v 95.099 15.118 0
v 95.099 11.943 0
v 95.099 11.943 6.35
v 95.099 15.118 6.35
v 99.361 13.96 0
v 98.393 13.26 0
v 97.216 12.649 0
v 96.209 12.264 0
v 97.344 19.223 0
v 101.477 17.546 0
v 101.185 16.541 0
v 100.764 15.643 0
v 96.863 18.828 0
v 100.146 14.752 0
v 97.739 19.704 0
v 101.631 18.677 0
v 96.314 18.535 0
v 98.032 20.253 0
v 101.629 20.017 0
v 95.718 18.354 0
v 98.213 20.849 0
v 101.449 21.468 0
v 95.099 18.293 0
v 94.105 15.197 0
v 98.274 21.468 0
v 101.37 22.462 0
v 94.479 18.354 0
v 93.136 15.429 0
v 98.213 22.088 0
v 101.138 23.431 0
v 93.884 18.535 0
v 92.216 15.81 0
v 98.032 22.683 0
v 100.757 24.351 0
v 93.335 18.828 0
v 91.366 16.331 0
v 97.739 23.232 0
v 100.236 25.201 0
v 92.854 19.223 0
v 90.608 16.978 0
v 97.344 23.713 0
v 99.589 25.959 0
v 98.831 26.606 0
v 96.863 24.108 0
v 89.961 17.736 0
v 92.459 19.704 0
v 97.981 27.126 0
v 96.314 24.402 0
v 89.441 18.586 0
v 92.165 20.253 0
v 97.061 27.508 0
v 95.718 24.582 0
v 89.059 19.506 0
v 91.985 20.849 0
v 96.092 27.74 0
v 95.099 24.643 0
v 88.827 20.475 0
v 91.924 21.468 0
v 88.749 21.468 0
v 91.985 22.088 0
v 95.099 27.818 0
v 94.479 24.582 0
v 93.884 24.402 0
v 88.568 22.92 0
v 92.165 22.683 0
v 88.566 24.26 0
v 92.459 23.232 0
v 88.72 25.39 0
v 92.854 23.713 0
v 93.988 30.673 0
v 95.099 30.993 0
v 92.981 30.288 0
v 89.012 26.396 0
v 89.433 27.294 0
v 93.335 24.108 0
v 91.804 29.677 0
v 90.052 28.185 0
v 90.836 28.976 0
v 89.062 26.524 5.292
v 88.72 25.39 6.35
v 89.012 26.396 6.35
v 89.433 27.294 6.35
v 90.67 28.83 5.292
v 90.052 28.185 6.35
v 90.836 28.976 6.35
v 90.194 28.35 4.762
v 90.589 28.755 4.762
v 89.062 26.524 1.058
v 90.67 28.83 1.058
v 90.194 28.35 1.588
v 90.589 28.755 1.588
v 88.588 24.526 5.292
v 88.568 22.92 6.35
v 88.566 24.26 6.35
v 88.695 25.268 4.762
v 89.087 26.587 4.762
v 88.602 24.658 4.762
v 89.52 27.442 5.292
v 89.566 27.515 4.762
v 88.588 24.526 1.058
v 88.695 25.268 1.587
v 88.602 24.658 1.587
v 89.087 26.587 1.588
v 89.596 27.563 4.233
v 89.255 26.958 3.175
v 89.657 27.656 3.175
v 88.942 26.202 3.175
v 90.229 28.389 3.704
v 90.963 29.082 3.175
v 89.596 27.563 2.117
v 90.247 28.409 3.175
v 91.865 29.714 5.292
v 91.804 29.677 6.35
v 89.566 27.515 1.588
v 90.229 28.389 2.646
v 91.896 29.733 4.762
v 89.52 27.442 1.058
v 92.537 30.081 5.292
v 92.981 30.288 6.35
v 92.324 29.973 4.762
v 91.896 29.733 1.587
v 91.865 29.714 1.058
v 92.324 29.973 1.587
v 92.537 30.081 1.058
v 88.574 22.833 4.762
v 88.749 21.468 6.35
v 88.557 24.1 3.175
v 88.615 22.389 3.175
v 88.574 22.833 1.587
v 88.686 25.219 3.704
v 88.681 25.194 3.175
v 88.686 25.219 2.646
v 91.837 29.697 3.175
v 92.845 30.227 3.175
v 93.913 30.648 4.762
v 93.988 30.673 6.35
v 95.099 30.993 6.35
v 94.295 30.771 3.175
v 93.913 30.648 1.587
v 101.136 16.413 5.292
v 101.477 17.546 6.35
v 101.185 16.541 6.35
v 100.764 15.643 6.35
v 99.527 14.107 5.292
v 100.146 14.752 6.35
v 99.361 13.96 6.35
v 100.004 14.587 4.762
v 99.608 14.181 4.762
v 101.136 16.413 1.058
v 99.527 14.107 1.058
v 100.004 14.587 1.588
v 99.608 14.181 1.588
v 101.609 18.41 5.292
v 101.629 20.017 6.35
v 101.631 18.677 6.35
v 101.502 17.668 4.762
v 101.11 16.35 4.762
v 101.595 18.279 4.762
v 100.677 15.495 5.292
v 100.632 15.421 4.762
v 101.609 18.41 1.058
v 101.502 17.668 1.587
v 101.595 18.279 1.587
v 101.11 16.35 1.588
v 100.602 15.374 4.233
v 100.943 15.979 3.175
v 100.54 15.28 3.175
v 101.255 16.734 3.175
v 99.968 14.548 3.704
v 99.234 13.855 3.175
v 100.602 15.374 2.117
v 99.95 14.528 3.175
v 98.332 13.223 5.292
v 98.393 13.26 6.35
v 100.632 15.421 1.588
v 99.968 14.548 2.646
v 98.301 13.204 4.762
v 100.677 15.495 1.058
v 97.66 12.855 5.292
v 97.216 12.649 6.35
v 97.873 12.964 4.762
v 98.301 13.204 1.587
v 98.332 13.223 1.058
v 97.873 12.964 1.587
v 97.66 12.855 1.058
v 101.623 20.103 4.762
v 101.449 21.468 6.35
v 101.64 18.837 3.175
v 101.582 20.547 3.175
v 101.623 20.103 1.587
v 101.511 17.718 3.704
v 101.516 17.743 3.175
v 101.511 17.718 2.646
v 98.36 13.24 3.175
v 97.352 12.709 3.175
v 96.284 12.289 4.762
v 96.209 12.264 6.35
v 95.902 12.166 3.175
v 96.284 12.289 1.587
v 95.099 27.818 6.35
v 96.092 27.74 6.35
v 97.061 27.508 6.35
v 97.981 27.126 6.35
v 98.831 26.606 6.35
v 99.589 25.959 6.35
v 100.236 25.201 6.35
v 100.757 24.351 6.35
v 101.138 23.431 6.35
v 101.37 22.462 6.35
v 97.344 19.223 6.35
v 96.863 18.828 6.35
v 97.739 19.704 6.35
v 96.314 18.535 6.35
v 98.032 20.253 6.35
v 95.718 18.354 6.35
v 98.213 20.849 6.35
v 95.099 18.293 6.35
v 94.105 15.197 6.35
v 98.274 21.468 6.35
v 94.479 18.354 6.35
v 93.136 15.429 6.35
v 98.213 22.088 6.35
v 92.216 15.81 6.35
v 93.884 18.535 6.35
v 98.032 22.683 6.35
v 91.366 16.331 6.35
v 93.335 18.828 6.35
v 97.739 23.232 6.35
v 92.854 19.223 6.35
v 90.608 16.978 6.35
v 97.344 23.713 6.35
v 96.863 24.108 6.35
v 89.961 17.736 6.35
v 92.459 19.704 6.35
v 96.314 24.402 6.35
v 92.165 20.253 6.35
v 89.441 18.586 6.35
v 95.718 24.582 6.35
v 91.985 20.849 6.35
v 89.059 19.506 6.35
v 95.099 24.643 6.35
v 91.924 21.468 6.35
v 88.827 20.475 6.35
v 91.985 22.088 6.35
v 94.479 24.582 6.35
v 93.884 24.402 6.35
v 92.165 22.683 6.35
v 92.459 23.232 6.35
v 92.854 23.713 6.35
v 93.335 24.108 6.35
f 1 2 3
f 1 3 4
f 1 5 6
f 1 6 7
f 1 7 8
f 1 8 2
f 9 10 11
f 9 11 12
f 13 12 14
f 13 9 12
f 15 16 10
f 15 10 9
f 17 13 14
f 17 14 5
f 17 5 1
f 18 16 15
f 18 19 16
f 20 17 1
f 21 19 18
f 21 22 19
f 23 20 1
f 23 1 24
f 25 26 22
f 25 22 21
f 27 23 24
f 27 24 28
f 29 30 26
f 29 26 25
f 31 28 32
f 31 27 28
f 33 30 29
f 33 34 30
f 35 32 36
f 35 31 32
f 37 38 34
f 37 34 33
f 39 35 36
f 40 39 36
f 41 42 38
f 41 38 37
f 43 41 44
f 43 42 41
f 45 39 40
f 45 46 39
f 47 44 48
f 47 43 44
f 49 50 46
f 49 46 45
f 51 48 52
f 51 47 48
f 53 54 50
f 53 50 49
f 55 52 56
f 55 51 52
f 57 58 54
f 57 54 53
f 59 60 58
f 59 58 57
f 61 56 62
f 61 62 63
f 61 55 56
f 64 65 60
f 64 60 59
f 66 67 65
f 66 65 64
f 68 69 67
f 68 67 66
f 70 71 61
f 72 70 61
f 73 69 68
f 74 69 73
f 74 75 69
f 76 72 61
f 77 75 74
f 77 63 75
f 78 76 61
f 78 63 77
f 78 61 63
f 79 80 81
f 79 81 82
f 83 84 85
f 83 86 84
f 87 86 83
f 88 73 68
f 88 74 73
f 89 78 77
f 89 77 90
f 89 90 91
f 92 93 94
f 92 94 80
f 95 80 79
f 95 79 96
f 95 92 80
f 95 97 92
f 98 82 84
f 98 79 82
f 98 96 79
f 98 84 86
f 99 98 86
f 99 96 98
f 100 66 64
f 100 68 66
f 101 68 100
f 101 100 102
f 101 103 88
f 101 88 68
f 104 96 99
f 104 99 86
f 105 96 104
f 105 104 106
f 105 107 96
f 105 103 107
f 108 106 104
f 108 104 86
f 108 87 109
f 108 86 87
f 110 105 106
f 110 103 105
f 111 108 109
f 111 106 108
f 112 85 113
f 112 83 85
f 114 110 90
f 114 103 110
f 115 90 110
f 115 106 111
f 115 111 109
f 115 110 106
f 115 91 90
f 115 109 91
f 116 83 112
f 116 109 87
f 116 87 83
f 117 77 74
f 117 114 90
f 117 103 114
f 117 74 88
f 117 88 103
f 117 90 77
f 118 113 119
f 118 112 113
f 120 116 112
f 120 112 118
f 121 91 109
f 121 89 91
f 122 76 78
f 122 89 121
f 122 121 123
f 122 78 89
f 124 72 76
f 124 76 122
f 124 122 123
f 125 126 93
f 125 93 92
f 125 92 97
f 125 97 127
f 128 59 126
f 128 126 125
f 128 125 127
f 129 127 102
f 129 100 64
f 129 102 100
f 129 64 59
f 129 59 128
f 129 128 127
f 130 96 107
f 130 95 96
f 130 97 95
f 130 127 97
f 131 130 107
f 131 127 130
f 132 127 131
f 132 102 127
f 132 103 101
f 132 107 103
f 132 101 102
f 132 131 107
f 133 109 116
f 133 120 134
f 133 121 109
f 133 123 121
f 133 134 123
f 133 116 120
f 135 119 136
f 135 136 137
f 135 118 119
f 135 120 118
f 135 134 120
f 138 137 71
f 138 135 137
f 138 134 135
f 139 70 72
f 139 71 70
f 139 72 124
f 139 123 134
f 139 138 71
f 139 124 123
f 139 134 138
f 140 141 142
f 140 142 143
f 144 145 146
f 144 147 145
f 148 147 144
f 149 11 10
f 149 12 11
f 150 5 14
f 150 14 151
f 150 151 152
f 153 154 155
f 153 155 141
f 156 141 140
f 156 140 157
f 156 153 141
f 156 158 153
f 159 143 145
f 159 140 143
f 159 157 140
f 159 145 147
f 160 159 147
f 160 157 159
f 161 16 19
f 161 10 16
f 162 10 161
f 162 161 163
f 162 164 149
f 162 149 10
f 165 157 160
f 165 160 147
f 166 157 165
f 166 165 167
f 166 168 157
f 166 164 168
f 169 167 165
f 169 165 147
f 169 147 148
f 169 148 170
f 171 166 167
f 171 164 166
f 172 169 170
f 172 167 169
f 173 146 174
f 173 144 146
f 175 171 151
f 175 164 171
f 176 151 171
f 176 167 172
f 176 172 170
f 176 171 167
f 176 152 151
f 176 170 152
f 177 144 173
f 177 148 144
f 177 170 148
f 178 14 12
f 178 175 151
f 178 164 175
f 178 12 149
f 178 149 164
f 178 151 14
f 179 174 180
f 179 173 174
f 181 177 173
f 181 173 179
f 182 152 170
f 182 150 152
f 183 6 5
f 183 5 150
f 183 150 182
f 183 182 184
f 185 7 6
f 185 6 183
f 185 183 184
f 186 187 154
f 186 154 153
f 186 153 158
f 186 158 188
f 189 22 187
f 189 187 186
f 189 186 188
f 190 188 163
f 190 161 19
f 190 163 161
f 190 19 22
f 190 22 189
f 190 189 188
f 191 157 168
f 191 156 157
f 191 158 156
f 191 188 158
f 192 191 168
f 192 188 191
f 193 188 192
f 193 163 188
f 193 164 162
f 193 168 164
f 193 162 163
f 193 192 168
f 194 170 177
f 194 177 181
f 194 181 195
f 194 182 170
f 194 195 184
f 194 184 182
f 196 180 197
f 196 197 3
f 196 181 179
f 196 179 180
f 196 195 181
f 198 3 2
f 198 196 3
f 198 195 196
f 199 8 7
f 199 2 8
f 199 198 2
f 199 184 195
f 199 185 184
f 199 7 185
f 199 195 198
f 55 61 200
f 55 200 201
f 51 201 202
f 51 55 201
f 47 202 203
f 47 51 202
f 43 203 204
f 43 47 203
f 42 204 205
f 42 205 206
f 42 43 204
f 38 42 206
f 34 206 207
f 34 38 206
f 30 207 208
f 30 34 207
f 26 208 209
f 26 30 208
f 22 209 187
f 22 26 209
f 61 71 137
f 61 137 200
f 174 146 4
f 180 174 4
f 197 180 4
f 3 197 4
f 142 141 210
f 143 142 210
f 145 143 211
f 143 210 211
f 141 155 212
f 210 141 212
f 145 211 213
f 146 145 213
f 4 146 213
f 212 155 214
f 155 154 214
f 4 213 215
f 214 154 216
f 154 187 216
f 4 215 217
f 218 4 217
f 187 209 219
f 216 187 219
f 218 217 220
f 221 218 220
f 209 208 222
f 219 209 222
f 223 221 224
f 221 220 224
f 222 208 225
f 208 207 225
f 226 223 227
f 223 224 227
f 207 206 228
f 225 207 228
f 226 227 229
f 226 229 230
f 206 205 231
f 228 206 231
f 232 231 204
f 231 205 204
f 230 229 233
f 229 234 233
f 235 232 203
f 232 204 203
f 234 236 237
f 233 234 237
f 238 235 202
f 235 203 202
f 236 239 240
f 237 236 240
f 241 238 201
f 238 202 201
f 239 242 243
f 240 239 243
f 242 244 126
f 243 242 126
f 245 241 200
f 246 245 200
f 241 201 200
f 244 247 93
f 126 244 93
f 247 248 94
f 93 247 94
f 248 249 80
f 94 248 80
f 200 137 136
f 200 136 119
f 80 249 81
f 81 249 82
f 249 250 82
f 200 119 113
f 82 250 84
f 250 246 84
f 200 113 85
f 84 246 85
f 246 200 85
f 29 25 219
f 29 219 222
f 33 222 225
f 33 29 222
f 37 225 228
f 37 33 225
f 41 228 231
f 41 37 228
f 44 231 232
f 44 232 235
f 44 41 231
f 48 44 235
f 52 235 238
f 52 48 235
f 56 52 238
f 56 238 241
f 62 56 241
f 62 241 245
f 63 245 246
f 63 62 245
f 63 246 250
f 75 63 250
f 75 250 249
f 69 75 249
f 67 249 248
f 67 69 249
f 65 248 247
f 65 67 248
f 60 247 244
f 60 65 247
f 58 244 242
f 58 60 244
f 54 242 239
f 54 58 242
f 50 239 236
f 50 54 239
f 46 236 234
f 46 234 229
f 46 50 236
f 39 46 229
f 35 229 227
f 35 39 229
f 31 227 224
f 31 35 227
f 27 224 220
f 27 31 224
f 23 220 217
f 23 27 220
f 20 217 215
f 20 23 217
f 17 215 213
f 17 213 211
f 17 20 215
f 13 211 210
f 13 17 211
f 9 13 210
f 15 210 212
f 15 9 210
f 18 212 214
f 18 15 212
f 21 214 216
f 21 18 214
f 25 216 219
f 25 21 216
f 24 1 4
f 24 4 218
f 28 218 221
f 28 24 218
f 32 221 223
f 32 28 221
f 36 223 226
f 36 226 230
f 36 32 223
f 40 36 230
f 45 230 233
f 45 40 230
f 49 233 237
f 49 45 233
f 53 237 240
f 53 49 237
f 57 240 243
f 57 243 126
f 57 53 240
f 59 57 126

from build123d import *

# Parameters (mm, degrees)
SKETCH2_R           = 3.175
BOSS_EXTRUDE1_DEPTH = 6.35


with BuildPart() as part:
    # Sketch2 → Boss-Extrude1 (new body)
    with BuildSketch(Plane.XY):
        with BuildLine():
            add(Edge.make_bspline(
                [(88.748610912, 21.468378691), (87.390018144, 29.081992428), (95.098610912, 30.993378691)],
                knots=[0, 0, 0, 1, 1, 1], degree=2))
            Line((95.098610912, 30.993378691), (95.098610912, 27.818378691))
            ThreePointArc((95.098610912, 27.818378691), (99.588738973, 25.958506751), (101.448610912, 21.468378691))
            add(Edge.make_bspline(
                [(101.448610912, 21.468378691), (102.807203681, 13.854764953), (95.098610912, 11.943378691)],
                knots=[0, 0, 0, 1, 1, 1], degree=2))
            Line((95.098610912, 11.943378691), (95.098610912, 15.118378691))
            ThreePointArc((95.098610912, 15.118378691), (90.608482852, 16.97825063), (88.748610912, 21.468378691))
        make_face()
        with Locations((95.098610912, 21.468378691)):
            Circle(SKETCH2_R, mode=Mode.SUBTRACT)
    extrude(amount=BOSS_EXTRUDE1_DEPTH)


solid = part.part
